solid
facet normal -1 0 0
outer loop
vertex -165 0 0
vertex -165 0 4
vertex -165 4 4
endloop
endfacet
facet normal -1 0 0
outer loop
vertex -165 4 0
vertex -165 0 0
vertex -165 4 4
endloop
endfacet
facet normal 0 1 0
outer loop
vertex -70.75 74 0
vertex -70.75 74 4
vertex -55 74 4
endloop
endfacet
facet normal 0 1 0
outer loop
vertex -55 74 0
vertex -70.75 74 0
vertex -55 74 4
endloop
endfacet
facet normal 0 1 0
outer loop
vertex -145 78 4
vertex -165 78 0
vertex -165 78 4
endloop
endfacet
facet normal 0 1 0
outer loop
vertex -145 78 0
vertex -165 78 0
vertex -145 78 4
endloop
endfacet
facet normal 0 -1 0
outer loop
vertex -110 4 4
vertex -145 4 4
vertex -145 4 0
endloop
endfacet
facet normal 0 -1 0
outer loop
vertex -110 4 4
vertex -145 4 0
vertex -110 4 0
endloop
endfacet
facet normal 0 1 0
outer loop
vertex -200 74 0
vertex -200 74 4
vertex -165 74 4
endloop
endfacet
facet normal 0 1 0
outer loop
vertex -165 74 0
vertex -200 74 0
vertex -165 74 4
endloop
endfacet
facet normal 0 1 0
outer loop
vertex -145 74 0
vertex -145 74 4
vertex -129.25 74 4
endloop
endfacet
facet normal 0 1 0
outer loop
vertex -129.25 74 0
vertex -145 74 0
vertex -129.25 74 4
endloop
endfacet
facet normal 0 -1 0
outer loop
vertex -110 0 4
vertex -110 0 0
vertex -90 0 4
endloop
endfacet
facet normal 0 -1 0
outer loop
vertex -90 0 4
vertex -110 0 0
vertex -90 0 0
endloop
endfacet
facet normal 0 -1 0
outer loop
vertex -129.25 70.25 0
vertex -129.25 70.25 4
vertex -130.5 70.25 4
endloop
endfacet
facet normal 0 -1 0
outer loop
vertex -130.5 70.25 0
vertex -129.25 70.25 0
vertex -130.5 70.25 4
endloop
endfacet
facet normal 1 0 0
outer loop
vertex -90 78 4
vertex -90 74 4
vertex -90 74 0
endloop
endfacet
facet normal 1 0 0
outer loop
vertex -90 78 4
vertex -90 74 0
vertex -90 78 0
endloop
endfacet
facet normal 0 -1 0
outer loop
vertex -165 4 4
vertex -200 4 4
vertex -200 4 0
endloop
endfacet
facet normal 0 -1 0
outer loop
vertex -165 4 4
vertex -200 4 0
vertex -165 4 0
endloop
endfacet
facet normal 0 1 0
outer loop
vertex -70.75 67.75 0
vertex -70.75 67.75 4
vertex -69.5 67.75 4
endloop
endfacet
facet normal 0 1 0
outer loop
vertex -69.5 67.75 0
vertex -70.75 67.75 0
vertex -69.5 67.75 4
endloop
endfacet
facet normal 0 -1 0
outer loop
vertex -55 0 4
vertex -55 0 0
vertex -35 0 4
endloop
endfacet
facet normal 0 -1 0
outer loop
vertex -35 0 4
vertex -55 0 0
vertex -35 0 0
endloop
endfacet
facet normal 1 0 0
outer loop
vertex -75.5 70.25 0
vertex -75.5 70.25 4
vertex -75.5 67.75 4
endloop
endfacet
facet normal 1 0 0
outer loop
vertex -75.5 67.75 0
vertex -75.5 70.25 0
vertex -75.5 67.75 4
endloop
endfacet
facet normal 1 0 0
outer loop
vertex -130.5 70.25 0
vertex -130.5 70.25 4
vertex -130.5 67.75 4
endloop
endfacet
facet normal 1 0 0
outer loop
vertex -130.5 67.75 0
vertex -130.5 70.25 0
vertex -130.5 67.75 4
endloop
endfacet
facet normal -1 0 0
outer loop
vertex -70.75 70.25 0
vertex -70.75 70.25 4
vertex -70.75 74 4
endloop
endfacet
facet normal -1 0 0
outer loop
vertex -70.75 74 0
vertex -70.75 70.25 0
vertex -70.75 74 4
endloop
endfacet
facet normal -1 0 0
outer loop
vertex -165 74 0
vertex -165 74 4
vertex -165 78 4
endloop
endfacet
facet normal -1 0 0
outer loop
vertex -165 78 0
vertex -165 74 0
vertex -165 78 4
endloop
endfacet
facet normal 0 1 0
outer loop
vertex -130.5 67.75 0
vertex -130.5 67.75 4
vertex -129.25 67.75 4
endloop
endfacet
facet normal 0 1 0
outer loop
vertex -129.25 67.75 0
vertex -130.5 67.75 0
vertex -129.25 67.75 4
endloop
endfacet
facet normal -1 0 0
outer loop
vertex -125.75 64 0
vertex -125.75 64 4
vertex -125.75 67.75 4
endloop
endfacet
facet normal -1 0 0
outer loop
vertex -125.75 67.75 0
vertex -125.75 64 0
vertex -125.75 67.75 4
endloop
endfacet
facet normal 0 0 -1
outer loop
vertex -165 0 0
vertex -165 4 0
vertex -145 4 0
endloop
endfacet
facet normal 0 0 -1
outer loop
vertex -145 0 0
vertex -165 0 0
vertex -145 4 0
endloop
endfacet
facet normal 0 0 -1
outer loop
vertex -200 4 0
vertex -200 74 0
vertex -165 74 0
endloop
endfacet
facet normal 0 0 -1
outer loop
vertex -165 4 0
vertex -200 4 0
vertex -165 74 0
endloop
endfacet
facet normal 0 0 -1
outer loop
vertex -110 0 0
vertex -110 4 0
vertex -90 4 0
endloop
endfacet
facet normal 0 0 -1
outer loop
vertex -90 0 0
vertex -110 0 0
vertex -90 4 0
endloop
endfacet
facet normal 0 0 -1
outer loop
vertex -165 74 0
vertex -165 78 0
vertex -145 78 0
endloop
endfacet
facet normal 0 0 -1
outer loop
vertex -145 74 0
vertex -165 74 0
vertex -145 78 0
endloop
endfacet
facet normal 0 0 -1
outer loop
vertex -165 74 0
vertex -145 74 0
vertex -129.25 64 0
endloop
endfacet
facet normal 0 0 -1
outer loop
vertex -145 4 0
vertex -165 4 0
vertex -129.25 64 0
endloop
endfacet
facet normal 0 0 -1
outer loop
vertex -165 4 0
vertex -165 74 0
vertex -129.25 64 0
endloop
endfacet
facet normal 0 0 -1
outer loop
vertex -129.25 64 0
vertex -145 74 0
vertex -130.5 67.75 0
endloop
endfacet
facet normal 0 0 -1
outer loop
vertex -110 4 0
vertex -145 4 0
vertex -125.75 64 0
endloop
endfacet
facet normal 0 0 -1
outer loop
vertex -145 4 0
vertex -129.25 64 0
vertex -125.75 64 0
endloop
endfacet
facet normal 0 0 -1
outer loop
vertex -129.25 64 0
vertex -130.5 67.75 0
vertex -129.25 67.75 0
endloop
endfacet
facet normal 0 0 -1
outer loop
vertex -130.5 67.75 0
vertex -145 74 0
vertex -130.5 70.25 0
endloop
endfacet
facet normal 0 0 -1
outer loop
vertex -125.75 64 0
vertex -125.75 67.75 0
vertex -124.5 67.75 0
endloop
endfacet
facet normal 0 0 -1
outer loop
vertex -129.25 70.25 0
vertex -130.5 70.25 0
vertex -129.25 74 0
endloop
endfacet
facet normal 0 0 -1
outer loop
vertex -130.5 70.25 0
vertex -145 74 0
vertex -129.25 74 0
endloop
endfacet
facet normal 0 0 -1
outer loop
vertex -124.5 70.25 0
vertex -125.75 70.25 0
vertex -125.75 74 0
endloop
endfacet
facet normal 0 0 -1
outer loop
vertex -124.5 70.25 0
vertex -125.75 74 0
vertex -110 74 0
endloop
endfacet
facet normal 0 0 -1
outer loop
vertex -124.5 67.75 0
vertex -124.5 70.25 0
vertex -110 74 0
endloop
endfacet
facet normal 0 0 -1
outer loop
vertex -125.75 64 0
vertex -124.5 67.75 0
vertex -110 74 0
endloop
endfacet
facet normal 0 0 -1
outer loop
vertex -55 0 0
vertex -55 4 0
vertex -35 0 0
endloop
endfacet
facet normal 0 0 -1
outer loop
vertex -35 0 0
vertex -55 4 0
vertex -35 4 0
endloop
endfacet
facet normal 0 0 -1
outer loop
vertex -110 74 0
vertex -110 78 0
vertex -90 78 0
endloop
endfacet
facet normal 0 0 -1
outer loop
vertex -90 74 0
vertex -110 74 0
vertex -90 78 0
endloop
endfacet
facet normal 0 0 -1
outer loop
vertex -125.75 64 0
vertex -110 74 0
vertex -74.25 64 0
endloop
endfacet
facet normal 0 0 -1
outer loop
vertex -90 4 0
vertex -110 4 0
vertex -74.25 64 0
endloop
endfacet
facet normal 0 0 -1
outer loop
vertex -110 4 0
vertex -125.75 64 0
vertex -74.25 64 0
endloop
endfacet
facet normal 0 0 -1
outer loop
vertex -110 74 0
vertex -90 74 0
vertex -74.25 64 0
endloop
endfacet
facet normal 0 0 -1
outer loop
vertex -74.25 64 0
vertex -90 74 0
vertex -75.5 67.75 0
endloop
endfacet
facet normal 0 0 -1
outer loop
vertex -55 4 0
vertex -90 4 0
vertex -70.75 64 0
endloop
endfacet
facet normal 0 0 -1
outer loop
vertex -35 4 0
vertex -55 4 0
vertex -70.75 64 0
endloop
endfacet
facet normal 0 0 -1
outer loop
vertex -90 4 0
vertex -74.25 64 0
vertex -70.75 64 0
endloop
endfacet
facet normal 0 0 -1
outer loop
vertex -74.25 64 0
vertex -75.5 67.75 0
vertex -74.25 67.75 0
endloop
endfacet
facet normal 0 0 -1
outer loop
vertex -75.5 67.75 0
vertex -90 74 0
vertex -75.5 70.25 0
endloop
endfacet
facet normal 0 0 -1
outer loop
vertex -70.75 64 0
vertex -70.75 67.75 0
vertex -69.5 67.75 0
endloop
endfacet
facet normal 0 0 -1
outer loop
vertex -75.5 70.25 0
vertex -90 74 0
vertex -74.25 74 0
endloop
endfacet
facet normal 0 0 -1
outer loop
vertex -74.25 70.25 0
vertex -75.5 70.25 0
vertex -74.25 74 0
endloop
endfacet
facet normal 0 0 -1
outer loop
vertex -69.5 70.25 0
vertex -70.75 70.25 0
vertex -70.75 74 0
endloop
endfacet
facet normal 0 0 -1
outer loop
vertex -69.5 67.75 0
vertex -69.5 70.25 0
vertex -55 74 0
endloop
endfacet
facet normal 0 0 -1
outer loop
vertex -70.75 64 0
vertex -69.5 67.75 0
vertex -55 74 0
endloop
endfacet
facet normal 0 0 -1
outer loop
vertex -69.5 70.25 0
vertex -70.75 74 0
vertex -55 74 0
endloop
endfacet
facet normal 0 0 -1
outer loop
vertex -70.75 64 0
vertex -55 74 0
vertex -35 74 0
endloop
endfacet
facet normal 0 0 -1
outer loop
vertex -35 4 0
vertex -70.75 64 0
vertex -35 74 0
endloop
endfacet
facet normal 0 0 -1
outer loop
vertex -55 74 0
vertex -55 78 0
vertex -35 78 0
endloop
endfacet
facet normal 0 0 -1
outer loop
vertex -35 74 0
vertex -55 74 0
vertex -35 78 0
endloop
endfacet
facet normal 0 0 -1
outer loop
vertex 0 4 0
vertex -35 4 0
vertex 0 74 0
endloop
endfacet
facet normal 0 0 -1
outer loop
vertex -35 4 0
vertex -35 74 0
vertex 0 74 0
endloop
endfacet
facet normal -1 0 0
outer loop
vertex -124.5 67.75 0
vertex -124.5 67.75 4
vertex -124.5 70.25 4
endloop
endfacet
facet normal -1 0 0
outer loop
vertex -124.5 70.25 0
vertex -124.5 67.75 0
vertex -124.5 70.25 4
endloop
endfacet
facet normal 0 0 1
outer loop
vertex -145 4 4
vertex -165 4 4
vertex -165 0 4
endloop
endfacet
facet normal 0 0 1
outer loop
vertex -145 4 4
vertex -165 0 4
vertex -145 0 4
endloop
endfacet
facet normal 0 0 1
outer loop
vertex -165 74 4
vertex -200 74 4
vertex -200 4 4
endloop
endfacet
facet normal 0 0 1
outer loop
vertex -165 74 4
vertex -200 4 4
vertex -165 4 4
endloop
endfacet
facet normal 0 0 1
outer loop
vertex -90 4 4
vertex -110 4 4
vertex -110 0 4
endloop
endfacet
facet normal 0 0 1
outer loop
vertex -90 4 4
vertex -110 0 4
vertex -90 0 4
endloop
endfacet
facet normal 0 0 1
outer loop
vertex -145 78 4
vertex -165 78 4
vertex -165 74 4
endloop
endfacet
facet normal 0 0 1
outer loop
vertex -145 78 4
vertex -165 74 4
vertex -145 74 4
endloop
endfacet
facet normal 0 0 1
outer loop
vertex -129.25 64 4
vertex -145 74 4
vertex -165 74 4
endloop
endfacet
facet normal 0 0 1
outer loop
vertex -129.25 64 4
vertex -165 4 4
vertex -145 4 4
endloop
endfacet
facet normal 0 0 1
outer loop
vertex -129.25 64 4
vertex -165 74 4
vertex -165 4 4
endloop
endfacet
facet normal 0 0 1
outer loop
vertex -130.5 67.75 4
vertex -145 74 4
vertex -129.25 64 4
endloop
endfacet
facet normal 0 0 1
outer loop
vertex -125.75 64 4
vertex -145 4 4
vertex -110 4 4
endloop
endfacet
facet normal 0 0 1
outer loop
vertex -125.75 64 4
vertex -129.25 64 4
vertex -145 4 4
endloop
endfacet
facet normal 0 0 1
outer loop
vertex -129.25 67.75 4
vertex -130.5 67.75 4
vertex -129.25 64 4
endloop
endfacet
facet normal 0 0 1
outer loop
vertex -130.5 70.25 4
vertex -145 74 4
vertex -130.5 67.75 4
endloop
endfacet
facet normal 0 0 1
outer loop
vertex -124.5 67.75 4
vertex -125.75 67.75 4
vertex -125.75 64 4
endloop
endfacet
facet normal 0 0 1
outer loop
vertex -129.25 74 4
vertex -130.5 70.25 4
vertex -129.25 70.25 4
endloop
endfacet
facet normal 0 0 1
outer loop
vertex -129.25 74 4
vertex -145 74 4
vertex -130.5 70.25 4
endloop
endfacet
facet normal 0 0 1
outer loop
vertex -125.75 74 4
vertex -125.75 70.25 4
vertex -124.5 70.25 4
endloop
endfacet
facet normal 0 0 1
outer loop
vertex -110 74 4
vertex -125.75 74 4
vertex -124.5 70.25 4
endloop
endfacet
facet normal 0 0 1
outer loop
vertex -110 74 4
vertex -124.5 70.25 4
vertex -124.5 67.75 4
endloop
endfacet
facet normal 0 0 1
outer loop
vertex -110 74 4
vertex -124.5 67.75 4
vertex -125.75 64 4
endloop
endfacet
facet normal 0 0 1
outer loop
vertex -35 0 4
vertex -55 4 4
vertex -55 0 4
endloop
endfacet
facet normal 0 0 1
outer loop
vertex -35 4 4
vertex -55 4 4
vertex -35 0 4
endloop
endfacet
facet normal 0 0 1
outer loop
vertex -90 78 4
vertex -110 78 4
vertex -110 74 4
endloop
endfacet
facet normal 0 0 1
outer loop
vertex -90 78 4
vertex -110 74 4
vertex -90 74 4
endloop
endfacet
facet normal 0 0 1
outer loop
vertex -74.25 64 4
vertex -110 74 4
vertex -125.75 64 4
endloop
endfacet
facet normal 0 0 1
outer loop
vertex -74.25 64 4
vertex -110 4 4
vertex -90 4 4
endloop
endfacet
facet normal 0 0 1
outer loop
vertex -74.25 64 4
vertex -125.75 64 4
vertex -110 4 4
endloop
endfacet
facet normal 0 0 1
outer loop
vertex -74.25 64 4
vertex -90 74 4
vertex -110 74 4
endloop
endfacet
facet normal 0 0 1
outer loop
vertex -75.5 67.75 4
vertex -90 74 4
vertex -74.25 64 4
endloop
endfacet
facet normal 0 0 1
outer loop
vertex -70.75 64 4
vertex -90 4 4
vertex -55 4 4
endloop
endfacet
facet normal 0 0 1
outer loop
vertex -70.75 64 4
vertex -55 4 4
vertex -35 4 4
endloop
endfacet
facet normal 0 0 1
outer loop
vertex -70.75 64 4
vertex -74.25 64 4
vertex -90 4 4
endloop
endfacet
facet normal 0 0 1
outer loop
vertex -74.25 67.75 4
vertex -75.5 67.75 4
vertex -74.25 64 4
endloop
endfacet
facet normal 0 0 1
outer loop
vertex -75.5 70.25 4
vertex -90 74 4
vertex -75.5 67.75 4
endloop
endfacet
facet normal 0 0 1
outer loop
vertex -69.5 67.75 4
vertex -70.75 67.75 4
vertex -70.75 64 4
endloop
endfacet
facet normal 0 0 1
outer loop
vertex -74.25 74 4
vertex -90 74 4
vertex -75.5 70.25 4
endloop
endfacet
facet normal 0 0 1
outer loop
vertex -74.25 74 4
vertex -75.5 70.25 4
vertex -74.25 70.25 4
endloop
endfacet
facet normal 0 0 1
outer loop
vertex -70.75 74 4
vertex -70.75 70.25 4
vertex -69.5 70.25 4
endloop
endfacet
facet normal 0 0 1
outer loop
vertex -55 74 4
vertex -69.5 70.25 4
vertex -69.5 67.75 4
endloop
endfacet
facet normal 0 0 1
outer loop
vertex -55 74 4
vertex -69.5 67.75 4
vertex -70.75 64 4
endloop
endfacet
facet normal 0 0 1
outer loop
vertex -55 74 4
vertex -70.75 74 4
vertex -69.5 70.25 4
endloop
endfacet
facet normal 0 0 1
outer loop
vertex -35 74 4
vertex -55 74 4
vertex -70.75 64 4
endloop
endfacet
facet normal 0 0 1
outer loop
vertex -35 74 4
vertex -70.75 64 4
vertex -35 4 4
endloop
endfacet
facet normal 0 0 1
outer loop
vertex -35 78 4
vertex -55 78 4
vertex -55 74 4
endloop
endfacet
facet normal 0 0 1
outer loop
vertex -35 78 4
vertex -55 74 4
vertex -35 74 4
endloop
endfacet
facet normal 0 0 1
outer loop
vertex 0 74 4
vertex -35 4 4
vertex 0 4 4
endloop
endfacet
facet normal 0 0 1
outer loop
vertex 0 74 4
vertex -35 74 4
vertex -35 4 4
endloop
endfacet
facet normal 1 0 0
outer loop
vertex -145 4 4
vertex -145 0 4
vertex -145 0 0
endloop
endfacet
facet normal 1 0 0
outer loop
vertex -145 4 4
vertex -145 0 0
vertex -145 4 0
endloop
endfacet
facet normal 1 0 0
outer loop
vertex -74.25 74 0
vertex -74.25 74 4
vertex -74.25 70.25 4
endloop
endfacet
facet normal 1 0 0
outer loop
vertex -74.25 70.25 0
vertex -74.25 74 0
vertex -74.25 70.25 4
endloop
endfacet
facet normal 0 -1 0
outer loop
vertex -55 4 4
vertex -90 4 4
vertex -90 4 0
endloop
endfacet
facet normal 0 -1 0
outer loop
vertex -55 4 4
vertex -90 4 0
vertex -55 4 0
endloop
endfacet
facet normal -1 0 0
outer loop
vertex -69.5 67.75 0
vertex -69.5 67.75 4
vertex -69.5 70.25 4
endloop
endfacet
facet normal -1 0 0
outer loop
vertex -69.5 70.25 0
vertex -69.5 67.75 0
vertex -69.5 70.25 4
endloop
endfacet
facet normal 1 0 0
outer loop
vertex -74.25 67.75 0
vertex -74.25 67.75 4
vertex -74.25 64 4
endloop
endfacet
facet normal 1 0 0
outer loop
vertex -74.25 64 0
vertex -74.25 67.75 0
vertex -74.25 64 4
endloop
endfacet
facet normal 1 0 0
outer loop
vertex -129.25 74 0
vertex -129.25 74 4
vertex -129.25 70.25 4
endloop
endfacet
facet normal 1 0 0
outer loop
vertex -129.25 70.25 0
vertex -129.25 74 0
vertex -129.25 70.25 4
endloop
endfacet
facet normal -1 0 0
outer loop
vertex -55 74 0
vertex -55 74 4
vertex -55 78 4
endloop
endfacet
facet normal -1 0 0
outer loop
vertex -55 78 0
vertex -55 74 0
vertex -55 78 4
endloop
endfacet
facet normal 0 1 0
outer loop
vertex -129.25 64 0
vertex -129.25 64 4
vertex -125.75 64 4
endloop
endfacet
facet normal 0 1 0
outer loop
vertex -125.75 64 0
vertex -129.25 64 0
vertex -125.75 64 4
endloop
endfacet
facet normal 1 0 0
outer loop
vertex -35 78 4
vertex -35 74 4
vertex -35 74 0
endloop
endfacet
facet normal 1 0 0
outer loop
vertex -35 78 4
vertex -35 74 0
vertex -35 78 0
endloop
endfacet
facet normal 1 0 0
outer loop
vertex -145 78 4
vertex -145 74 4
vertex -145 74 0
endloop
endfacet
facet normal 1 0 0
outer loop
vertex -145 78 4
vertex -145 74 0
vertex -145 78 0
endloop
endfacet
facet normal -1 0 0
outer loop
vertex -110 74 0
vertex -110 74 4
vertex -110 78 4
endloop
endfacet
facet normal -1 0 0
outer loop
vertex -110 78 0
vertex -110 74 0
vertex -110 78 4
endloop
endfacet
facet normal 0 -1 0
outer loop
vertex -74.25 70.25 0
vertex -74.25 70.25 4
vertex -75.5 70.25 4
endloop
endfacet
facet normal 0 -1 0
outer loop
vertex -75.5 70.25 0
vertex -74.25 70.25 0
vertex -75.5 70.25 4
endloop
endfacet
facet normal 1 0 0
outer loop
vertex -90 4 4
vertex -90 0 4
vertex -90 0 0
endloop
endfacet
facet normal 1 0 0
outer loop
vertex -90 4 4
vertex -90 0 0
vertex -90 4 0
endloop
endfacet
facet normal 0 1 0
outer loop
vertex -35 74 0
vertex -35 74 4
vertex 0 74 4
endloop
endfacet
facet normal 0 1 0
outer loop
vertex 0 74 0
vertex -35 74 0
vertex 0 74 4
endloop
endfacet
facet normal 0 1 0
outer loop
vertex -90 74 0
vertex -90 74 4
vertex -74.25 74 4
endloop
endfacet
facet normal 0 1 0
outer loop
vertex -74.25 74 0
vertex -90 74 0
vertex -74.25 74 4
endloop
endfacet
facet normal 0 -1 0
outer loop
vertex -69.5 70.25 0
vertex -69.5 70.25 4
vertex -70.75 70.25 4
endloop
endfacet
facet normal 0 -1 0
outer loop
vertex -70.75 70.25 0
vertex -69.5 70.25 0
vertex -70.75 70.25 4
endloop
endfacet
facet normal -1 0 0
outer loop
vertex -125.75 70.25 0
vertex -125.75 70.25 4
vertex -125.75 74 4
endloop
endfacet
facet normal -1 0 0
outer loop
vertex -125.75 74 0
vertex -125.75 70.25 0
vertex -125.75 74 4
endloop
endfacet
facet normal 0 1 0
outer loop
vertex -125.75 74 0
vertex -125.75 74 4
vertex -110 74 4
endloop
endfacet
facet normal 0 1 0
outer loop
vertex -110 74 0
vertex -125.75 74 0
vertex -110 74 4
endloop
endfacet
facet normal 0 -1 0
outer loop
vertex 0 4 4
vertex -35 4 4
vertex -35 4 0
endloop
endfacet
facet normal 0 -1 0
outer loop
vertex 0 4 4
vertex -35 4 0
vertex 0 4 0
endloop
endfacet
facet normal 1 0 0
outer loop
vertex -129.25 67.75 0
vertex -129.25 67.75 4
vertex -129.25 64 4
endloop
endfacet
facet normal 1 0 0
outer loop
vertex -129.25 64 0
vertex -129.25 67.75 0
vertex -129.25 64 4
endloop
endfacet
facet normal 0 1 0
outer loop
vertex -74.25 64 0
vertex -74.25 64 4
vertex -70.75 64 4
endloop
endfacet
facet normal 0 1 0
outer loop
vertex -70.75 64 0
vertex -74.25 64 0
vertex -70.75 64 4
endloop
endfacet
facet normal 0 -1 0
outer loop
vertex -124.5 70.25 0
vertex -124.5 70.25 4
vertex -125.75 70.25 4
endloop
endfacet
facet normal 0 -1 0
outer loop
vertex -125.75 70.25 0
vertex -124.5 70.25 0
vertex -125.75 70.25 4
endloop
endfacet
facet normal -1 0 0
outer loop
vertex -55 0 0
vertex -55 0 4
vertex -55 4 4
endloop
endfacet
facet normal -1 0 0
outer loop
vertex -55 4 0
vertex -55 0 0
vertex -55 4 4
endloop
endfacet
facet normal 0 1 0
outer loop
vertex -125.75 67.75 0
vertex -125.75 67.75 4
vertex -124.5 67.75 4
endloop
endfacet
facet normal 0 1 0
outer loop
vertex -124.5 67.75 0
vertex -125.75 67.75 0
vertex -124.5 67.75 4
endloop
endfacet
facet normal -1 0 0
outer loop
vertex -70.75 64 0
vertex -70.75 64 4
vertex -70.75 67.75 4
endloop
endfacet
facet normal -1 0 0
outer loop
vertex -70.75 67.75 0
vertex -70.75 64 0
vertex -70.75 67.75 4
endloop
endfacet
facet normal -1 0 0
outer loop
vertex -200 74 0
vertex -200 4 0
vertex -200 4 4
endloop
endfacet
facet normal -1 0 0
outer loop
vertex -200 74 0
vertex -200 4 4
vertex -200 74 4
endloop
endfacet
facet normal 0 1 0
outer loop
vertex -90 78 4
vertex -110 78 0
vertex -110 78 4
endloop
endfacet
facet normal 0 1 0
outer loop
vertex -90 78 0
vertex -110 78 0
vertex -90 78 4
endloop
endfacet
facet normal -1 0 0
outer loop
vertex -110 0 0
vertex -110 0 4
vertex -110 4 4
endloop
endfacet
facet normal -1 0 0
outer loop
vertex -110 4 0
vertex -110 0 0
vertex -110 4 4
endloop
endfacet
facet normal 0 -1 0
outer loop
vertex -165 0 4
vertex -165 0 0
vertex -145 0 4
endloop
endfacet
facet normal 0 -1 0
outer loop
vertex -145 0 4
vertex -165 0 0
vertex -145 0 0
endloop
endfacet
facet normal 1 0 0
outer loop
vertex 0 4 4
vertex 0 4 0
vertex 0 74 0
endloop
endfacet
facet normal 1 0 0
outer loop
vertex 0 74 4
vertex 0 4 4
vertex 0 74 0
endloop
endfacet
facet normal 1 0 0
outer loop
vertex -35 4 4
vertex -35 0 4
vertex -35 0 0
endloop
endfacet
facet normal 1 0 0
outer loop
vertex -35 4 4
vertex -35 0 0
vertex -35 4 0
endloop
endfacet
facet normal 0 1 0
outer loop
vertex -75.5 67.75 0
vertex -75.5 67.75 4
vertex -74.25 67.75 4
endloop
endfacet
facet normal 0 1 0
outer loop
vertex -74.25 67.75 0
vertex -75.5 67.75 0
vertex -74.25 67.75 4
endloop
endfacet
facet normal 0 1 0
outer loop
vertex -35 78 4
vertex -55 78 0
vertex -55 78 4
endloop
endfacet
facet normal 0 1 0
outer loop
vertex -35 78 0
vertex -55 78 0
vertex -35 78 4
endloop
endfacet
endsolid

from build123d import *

# Parameters (mm, degrees)
SKETCH1_W           = 200
SKETCH1_H           = 78
BOSS_EXTRUDE1_DEPTH = 4
SKETCH2_W           = 35
SKETCH2_H           = 4
CUT_EXTRUDE1_DEPTH  = 4
CUT_EXTRUDE2_DEPTH  = 4


with BuildPart() as part:
    # Sketch1 → Boss-Extrude1 (new body)
    with BuildSketch(Plane.XY):
        with Locations((-100, 39)):
            Rectangle(SKETCH1_W, SKETCH1_H)
    extrude(amount=BOSS_EXTRUDE1_DEPTH)

    # Sketch2 → Cut-Extrude1 (cut)
    with BuildSketch(Plane.XY.offset(4)):
        with Locations((-182.5, 76)):
            Rectangle(SKETCH2_W, SKETCH2_H)
        with Locations((-127.5, 76)):
            Rectangle(SKETCH2_W, SKETCH2_H)
        with Locations((-72.5, 76)):
            Rectangle(SKETCH2_W, SKETCH2_H)
        with Locations((-17.5, 76)):
            Rectangle(SKETCH2_W, SKETCH2_H)
        with Locations((-182.5, 2)):
            Rectangle(SKETCH2_W, SKETCH2_H)
        with Locations((-127.5, 2)):
            Rectangle(SKETCH2_W, SKETCH2_H)
        with Locations((-72.5, 2)):
            Rectangle(SKETCH2_W, SKETCH2_H)
        with Locations((-17.5, 2)):
            Rectangle(SKETCH2_W, SKETCH2_H)
    extrude(amount=-CUT_EXTRUDE1_DEPTH, mode=Mode.SUBTRACT)

    # Sketch4 → Cut-Extrude2 (cut)
    with BuildSketch(Plane.XY.offset(4)):
        Polygon((-125.75, 74), (-129.25, 74), (-129.25, 70.25), (-130.5, 70.25), (-130.5, 67.75), (-129.25, 67.75), (-129.25, 64), (-125.75, 64), (-125.75, 67.75), (-124.5, 67.75), (-124.5, 70.25), (-125.75, 70.25), align=None)
        Polygon((-70.75, 67.75), (-69.5, 67.75), (-69.5, 70.25), (-70.75, 70.25), (-70.75, 74), (-74.25, 74), (-74.25, 70.25), (-75.5, 70.25), (-75.5, 67.75), (-74.25, 67.75), (-74.25, 64), (-70.75, 64), align=None)
    extrude(amount=-CUT_EXTRUDE2_DEPTH, mode=Mode.SUBTRACT)


solid = part.part
